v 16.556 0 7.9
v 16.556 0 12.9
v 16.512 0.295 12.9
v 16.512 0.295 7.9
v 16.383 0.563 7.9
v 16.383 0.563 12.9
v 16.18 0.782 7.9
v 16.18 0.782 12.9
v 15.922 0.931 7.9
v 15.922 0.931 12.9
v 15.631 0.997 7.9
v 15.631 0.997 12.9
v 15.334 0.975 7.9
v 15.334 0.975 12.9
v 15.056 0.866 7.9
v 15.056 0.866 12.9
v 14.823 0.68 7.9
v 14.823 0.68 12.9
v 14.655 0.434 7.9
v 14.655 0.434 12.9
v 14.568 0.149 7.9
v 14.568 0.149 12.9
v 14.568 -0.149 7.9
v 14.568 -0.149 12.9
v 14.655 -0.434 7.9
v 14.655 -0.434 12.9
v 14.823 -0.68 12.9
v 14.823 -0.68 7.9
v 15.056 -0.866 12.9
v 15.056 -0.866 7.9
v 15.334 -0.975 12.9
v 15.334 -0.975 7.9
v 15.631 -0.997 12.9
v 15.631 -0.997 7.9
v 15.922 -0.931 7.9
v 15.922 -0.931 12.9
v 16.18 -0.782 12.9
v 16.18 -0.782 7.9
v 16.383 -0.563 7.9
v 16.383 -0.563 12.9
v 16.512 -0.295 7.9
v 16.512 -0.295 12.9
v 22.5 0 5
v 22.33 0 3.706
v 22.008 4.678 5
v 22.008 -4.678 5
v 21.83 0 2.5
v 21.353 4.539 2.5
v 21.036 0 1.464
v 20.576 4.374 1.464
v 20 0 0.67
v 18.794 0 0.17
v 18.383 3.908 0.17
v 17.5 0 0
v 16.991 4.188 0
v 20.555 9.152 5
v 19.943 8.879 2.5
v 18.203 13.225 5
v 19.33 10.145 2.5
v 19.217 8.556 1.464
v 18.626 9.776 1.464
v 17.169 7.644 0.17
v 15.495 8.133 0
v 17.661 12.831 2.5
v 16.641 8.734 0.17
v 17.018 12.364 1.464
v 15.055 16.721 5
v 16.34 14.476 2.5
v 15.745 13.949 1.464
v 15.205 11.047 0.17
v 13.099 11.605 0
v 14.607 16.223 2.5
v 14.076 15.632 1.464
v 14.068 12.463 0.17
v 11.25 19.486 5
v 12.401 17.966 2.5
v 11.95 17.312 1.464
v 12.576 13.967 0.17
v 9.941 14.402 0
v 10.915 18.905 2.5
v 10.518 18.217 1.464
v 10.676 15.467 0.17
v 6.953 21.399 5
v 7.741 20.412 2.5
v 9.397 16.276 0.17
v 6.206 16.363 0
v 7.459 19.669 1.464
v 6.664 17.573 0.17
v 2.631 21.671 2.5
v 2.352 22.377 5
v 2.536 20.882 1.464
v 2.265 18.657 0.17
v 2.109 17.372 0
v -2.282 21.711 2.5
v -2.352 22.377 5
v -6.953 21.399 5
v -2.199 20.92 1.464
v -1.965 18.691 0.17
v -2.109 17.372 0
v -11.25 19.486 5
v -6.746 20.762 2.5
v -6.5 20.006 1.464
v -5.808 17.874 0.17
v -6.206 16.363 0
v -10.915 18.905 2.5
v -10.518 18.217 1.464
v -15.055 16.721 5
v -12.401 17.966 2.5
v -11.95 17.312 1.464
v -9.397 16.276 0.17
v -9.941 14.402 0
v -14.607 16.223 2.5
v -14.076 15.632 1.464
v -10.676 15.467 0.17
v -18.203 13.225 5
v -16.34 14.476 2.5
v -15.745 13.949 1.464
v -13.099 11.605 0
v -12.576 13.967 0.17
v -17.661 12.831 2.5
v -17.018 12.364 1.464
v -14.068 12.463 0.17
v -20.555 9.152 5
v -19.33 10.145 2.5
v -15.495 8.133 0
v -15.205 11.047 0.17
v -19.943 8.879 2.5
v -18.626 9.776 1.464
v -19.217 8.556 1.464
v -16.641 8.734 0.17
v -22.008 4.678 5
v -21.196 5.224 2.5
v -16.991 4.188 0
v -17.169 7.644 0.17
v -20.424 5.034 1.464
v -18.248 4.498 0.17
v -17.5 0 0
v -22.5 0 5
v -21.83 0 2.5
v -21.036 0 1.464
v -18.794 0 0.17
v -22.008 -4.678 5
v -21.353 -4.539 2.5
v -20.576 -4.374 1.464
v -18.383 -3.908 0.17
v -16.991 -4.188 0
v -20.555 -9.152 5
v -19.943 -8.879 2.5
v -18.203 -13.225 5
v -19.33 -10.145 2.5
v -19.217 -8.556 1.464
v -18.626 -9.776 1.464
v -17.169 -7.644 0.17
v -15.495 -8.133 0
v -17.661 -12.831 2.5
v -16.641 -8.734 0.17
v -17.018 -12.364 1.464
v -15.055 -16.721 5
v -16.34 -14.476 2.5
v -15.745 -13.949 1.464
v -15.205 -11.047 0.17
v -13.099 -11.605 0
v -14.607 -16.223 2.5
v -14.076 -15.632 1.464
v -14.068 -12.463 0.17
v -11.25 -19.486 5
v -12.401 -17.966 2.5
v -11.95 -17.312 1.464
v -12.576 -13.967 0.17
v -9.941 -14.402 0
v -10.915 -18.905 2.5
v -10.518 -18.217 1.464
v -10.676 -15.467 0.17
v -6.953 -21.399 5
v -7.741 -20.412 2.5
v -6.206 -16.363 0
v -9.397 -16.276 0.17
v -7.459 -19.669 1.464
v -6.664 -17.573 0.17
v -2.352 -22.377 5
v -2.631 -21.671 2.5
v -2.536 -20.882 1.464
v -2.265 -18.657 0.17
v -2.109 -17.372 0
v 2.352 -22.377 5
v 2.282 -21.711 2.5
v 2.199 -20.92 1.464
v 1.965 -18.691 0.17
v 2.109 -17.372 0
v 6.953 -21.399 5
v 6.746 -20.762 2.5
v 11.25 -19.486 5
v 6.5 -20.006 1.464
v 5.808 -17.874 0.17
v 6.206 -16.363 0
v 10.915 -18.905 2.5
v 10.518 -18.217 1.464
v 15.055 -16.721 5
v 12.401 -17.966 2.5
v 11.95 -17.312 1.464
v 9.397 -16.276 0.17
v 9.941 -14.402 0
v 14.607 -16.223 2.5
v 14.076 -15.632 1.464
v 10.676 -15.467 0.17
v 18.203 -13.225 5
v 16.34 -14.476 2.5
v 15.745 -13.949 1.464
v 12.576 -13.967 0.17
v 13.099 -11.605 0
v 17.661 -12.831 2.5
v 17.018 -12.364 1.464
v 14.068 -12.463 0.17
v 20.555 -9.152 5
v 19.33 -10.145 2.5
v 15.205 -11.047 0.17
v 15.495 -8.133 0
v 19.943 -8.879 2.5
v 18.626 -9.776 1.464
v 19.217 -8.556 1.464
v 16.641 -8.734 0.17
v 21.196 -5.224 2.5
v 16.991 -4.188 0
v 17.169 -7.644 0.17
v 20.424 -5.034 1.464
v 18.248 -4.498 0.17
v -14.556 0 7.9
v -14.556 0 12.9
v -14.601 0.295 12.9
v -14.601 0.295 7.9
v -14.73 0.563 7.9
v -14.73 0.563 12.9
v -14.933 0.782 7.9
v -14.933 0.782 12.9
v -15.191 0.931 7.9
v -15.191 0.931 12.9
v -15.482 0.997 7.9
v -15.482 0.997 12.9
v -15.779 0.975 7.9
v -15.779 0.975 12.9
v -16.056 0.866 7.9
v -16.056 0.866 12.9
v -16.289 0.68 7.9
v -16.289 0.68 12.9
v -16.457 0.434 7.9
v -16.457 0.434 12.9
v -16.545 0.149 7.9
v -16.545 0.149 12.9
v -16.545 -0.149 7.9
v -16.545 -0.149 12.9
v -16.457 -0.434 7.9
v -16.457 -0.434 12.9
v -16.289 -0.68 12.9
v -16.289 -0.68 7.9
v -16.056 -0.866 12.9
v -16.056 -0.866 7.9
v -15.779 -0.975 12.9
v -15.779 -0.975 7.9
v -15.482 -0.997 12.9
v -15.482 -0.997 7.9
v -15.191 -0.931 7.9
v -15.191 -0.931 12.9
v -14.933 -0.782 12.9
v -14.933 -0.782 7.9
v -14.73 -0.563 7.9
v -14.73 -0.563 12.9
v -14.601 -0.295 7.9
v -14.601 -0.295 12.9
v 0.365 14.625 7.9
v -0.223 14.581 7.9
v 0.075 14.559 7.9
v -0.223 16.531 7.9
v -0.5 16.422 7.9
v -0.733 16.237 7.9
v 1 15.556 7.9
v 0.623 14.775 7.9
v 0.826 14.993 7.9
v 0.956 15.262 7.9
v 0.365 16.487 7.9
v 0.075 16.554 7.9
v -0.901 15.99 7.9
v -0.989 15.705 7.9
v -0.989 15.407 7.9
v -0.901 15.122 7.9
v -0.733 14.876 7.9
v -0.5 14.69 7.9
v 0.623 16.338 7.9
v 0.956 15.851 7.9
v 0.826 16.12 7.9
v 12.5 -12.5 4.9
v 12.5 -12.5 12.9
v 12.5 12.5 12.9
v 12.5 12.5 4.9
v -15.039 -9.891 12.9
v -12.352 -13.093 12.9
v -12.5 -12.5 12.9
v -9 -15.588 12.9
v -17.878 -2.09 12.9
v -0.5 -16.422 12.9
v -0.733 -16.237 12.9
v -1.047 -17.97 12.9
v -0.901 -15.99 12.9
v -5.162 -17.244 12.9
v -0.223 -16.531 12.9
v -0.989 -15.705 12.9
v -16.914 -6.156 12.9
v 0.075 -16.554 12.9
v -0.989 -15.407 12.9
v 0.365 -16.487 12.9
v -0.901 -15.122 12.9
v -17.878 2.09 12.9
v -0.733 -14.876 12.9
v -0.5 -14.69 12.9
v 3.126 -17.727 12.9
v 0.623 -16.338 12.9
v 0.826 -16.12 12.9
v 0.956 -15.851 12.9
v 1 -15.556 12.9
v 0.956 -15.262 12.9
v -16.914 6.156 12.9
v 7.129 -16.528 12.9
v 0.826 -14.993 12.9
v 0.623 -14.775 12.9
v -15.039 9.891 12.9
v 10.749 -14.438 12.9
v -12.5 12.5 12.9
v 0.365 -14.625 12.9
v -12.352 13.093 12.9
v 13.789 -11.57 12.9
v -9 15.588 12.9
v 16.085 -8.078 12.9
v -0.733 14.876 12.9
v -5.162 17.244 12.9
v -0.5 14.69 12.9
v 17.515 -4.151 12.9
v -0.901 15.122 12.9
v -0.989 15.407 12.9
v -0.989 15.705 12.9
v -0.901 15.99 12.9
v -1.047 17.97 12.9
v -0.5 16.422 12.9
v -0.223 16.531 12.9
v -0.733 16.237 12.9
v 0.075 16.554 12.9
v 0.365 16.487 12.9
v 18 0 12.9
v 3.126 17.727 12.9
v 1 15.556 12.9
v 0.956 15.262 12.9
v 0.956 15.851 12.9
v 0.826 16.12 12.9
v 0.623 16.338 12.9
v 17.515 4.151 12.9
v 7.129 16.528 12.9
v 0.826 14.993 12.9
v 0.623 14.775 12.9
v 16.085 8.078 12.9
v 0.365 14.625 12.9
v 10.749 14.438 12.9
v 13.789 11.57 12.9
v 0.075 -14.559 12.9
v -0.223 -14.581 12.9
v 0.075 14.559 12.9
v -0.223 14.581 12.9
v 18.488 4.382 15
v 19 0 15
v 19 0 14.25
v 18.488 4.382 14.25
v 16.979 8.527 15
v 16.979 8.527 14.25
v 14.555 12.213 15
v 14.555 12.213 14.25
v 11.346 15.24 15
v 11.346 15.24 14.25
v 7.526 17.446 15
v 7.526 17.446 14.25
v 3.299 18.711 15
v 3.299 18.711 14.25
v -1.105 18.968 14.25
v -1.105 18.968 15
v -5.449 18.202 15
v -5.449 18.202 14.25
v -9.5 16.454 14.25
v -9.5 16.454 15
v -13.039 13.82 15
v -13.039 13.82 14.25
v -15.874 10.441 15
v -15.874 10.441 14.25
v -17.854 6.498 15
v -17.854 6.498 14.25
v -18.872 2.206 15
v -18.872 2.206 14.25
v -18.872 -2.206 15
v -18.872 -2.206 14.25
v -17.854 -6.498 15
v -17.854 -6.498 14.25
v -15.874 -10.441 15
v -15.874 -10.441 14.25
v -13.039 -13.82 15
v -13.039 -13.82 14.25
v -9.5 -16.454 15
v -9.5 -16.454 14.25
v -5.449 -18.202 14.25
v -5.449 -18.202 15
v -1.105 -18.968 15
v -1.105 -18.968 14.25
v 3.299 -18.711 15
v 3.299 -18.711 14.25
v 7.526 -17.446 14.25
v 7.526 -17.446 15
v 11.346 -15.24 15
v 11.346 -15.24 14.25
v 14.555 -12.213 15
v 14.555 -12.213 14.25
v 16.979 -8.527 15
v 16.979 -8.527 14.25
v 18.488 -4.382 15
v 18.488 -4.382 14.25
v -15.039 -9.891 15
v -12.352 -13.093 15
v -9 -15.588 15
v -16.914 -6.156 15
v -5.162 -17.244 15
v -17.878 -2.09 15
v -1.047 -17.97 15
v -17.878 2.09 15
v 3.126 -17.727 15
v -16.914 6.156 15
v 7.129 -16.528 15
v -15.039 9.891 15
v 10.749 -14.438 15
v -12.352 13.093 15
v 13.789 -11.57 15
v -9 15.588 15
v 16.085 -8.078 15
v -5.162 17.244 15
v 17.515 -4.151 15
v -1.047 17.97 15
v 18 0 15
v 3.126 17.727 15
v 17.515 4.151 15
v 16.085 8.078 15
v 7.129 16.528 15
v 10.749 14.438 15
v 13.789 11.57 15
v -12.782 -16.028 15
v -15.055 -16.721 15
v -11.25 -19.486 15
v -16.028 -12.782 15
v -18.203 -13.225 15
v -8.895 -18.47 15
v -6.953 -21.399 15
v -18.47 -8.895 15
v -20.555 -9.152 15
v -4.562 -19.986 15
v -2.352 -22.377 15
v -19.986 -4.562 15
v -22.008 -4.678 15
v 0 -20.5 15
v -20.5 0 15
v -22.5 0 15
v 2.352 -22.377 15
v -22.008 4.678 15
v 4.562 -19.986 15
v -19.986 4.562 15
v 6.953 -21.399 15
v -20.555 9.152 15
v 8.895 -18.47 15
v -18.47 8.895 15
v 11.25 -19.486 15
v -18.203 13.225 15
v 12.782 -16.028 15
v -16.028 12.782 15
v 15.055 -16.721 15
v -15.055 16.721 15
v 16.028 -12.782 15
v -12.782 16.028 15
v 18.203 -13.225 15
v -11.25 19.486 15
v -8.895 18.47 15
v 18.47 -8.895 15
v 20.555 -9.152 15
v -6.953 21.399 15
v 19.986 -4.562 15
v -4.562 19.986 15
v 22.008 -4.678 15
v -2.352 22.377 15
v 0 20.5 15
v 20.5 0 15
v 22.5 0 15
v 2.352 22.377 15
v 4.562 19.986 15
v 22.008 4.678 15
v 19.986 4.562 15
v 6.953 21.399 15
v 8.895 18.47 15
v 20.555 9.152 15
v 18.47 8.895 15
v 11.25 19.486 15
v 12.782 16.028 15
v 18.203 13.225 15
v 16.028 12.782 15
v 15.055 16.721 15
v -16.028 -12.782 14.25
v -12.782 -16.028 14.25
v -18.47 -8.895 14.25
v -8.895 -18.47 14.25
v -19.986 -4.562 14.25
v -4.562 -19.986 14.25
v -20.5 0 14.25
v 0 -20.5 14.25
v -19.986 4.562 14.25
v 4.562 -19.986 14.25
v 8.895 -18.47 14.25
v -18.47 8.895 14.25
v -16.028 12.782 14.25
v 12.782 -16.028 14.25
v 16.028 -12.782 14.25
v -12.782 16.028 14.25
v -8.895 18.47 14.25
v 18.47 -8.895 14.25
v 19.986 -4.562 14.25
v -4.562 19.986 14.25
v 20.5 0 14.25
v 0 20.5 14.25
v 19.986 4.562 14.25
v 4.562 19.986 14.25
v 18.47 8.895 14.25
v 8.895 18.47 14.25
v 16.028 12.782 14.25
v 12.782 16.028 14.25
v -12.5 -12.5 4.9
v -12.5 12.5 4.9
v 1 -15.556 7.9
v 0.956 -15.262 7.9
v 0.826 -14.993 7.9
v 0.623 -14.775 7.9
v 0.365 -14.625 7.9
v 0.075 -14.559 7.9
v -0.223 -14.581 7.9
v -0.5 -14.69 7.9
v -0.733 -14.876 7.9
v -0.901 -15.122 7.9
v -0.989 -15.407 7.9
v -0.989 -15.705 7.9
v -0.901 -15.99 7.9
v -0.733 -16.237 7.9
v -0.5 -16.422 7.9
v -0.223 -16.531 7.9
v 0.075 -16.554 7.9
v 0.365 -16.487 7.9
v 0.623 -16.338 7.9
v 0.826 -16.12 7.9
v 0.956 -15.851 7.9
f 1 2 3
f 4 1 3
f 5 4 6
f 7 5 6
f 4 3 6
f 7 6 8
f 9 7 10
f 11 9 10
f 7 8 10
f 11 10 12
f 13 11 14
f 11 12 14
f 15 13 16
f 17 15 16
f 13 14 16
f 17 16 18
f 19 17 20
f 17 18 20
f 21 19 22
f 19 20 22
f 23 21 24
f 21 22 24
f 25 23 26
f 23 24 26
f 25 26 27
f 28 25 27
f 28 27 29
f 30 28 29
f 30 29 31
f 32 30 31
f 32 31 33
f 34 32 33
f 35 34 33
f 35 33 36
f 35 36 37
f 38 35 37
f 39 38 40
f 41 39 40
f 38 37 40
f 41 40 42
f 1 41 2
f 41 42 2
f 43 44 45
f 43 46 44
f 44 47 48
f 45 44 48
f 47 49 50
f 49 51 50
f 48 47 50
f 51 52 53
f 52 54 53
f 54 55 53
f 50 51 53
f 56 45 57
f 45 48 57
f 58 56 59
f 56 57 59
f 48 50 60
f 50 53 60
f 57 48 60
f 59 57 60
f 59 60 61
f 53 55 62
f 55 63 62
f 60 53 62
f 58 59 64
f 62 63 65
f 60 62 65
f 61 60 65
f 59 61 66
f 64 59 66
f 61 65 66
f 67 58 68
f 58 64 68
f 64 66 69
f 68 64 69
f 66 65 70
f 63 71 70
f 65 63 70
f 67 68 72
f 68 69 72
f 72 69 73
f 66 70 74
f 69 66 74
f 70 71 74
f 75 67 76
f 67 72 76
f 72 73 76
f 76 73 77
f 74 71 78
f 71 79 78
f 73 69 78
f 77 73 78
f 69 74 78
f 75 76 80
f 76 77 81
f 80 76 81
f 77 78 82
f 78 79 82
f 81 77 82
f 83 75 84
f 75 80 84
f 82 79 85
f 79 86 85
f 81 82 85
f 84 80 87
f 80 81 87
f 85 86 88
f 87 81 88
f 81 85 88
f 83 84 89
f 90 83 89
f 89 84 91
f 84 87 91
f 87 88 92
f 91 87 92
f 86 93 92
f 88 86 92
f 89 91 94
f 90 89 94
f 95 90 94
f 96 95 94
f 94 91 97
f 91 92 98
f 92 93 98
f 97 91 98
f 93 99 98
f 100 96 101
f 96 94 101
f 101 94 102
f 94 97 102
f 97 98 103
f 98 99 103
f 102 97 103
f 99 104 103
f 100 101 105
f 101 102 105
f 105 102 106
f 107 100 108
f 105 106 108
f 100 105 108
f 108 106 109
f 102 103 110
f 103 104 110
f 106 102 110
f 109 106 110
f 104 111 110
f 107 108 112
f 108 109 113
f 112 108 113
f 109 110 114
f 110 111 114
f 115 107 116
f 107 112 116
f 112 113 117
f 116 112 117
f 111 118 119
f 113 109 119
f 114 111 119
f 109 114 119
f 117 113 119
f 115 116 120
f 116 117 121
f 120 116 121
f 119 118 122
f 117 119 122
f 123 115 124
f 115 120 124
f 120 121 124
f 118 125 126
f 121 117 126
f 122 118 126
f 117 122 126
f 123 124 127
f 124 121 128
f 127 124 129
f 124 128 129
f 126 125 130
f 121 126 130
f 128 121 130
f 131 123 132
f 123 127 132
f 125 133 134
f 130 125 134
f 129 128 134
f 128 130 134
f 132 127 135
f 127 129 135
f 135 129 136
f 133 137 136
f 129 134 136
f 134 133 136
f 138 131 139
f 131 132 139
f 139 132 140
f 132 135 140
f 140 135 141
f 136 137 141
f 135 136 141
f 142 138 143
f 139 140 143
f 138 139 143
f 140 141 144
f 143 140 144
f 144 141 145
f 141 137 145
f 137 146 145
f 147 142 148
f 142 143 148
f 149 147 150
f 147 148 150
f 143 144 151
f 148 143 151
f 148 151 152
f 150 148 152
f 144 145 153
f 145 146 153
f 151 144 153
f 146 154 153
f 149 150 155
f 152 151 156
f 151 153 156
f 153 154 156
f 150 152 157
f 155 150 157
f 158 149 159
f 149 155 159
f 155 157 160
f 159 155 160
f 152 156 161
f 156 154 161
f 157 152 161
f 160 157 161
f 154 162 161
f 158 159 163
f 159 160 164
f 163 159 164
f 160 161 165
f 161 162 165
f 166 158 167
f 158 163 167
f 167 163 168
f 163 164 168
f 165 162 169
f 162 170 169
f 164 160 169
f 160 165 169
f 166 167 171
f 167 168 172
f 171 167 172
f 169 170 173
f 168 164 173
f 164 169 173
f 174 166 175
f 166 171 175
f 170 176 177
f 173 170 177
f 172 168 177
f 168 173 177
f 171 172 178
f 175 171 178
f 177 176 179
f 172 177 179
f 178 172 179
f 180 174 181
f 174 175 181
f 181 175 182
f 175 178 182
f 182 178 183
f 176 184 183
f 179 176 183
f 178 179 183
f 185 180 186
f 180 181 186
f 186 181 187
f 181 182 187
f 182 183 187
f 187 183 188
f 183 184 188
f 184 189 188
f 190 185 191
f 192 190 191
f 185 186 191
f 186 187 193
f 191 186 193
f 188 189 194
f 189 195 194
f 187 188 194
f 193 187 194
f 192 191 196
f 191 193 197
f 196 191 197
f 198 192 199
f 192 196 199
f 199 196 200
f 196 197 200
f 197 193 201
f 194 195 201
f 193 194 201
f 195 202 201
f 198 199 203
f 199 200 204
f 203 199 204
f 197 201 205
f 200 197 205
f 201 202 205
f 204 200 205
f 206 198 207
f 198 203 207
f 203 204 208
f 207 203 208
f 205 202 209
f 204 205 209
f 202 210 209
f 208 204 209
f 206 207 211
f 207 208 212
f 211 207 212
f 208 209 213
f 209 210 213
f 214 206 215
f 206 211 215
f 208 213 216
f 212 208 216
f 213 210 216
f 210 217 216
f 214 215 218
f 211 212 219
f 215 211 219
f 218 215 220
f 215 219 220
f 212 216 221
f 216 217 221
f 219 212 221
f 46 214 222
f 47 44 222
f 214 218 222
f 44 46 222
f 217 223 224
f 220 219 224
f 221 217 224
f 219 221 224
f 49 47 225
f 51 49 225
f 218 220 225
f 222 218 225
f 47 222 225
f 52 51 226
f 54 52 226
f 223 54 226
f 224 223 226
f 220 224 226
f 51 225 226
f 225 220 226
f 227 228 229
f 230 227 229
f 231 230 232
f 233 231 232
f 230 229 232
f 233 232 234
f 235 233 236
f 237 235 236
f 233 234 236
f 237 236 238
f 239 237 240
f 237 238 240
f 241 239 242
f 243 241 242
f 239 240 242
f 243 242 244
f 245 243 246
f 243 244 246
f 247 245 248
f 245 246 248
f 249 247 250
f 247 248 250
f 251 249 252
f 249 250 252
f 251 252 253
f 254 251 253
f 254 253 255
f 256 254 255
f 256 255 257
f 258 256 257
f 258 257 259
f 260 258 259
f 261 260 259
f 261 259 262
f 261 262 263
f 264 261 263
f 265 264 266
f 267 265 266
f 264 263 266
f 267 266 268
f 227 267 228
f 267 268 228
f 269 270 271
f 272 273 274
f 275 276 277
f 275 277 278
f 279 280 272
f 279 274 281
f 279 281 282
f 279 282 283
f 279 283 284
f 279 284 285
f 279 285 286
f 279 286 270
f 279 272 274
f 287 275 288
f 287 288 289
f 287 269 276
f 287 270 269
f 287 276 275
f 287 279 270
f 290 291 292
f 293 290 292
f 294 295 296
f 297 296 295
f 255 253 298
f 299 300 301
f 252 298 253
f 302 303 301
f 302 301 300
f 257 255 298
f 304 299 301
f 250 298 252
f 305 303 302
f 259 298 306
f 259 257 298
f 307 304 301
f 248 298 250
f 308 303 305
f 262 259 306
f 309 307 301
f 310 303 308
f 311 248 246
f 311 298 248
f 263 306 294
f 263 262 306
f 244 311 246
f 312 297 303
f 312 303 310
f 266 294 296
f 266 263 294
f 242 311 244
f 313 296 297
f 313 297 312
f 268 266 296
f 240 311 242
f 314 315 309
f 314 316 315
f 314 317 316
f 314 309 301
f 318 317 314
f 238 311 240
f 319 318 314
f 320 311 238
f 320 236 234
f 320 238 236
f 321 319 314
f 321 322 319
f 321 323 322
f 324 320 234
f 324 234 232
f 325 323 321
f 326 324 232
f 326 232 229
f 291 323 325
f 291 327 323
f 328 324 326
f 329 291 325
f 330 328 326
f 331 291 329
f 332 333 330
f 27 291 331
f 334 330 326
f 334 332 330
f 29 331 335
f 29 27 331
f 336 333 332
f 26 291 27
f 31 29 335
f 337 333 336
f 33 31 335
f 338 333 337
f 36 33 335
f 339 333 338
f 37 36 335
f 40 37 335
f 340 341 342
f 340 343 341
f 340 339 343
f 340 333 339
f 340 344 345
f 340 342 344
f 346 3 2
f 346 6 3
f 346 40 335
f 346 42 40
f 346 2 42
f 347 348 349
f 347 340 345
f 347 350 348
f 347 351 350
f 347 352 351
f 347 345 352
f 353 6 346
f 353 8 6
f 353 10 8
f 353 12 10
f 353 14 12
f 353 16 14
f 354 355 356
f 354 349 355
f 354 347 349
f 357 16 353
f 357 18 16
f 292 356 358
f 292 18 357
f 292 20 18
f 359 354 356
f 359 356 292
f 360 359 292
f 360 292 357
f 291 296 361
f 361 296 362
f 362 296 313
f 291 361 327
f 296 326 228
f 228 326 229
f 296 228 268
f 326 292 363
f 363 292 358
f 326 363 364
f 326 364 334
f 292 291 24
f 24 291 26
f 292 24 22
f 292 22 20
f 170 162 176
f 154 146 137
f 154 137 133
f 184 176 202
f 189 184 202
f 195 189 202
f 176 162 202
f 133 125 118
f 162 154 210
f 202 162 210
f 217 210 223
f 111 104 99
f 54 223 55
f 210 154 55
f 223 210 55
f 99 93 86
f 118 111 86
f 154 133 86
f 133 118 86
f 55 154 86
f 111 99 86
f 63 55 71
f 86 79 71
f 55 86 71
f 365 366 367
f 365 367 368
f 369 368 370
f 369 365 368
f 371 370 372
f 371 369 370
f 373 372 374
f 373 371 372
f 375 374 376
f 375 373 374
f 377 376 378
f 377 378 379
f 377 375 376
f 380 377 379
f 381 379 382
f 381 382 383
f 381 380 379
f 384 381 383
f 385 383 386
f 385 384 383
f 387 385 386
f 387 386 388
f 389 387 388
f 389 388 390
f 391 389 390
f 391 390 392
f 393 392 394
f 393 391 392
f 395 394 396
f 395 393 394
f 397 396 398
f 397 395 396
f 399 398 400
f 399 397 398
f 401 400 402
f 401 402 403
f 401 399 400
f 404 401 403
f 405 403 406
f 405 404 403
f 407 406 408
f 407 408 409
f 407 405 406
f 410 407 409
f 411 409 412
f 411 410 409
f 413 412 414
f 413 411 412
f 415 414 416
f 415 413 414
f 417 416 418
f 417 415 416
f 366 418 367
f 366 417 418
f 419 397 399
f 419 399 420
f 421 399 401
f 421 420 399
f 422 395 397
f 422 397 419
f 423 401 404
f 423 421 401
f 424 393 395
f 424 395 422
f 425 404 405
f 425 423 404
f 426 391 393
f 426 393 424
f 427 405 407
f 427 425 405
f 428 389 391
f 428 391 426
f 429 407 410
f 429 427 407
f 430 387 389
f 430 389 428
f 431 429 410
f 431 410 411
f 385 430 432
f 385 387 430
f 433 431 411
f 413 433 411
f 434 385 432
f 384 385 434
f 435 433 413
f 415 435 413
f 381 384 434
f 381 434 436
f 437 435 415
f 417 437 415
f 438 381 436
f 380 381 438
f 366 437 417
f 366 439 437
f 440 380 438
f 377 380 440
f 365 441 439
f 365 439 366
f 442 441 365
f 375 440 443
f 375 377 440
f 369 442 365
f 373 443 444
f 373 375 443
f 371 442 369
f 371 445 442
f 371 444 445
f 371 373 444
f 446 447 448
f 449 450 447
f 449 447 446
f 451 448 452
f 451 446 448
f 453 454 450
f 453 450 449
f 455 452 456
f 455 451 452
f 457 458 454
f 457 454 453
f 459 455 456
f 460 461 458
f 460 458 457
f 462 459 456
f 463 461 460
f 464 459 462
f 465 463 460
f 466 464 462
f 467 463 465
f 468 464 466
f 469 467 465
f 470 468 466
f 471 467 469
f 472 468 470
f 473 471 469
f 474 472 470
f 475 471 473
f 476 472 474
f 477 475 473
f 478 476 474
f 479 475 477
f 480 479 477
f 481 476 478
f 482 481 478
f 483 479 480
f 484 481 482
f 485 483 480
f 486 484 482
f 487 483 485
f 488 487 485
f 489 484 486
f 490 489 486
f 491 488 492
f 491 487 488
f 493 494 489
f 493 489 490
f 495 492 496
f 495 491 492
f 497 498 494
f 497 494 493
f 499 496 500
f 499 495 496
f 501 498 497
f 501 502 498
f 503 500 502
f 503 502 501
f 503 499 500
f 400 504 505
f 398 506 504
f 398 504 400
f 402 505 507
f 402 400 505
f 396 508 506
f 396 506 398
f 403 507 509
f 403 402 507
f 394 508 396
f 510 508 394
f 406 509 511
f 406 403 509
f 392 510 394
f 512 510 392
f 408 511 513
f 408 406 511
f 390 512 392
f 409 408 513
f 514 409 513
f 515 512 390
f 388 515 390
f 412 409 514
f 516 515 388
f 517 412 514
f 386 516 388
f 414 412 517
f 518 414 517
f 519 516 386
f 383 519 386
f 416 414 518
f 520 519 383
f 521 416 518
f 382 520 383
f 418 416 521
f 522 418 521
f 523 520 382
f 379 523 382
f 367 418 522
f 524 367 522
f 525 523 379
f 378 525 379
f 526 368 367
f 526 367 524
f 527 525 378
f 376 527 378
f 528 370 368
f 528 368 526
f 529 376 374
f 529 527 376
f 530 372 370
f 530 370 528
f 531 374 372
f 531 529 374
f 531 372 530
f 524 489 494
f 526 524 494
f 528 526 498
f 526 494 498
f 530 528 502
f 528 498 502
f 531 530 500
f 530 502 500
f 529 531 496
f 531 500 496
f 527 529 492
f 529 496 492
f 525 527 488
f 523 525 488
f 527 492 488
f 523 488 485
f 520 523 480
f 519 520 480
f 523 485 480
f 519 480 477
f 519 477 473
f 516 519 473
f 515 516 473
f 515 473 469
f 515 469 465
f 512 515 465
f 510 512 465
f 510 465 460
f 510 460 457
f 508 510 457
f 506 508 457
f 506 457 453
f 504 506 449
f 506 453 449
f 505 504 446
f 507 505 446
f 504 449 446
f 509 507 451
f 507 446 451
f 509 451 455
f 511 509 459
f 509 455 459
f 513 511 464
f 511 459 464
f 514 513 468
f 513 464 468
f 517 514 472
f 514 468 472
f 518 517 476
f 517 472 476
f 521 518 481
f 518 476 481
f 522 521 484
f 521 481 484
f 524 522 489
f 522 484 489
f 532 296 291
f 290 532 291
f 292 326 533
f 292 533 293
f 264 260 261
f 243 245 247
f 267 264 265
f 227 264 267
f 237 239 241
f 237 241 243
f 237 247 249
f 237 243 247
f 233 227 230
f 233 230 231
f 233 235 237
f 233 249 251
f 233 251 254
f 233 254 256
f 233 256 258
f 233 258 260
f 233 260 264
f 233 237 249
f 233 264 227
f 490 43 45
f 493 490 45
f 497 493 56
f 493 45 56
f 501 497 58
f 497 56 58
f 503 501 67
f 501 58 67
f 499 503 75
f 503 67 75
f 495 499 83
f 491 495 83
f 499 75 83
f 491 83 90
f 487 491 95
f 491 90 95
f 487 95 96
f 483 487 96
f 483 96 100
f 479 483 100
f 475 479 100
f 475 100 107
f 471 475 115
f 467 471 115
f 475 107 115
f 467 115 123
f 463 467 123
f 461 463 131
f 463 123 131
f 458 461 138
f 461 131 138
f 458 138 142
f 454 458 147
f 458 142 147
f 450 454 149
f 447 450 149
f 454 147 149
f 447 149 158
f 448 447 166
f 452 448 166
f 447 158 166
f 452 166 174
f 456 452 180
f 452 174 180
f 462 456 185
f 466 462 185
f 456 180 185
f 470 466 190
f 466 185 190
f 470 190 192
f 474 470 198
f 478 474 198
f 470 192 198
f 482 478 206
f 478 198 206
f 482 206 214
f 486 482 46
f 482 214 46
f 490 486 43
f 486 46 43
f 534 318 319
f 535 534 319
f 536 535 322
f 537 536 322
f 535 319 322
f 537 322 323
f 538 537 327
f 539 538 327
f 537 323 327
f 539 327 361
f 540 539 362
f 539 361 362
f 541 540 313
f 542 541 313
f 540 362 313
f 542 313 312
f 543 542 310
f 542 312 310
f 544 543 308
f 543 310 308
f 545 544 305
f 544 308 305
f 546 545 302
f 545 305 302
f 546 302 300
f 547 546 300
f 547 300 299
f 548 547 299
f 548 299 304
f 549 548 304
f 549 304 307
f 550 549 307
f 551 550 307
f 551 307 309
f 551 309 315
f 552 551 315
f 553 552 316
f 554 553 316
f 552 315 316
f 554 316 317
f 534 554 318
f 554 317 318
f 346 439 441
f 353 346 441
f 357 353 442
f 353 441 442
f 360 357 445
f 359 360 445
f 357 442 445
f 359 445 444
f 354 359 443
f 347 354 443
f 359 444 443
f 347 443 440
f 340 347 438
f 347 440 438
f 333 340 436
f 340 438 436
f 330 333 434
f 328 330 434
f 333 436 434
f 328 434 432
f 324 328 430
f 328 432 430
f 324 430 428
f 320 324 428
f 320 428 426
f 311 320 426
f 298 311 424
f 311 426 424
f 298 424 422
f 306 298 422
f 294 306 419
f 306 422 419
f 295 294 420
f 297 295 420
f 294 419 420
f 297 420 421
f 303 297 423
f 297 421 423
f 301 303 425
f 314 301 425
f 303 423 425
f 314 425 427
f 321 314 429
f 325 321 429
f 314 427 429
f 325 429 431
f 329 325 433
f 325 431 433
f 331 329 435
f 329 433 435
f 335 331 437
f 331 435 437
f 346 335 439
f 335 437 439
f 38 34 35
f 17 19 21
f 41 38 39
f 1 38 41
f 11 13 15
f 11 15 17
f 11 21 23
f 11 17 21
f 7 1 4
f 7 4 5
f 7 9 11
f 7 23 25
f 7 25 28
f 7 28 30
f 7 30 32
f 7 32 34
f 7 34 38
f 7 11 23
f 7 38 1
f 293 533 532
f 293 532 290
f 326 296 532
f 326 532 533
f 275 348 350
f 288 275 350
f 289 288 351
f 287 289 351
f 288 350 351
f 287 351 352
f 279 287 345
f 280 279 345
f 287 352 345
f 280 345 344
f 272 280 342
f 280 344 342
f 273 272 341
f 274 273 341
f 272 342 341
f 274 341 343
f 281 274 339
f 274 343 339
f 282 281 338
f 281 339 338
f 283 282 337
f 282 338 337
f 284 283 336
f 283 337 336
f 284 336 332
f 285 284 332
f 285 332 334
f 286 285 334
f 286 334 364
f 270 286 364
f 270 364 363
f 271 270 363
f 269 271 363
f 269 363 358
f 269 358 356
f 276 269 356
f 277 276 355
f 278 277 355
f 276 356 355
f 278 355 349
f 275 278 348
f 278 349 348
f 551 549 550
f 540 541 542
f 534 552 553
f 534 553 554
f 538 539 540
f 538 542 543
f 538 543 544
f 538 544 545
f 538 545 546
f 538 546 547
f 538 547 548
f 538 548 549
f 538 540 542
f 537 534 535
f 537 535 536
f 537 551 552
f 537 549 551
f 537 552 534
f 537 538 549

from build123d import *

# Parameters (mm, degrees)
F0_R      = 22.5
F1_DEPTH  = 15
F2_R      = 18
F3_DEPTH  = 2.1
F4_W      = 25
F4_H      = 25
F5_DEPTH  = 8
F6_R      = 5
F7_R      = 1
F8_DEPTH  = 5
F9_R      = 20.5
F9_R_2    = 19
F10_DEPTH = 0.75


with BuildPart() as f1:
    # F0 (on Top) → F1 (new body)
    with BuildSketch(Plane.XY):
        Circle(F0_R)
    extrude(amount=F1_DEPTH)

    # F2 (on face) → F3 (cut)
    with BuildSketch(Plane.XY.offset(15)):
        Circle(F2_R)
    extrude(amount=-F3_DEPTH, mode=Mode.SUBTRACT)

    # F4 (on face) → F5 (cut)
    with BuildSketch(Plane.XY.offset(12.9)):
        Rectangle(F4_W, F4_H)
    extrude(amount=-F5_DEPTH, mode=Mode.SUBTRACT)

    # F6
    f6_edges = [f1.edges().sort_by_distance(p)[0] for p in [
        (-22.5, 0, 0),
    ]]
    fillet(f6_edges, radius=F6_R)

    # F7 (on face) → F8 (cut)
    with BuildSketch(Plane.XY.offset(12.9)):
        with Locations((0, 15.556349)):
            Circle(F7_R)
        with Locations((15.556349, 0)):
            Circle(F7_R)
        with Locations((-15.556349, 0)):
            Circle(F7_R)
        with Locations((0, -15.556349)):
            Circle(F7_R)
    extrude(amount=-F8_DEPTH, mode=Mode.SUBTRACT)

    # F9 (on face) → F10 (cut)
    with BuildSketch(Plane.XY.offset(15)):
        Circle(F9_R)
        Circle(F9_R_2, mode=Mode.SUBTRACT)
    extrude(amount=-F10_DEPTH, mode=Mode.SUBTRACT)


solid = f1.part
